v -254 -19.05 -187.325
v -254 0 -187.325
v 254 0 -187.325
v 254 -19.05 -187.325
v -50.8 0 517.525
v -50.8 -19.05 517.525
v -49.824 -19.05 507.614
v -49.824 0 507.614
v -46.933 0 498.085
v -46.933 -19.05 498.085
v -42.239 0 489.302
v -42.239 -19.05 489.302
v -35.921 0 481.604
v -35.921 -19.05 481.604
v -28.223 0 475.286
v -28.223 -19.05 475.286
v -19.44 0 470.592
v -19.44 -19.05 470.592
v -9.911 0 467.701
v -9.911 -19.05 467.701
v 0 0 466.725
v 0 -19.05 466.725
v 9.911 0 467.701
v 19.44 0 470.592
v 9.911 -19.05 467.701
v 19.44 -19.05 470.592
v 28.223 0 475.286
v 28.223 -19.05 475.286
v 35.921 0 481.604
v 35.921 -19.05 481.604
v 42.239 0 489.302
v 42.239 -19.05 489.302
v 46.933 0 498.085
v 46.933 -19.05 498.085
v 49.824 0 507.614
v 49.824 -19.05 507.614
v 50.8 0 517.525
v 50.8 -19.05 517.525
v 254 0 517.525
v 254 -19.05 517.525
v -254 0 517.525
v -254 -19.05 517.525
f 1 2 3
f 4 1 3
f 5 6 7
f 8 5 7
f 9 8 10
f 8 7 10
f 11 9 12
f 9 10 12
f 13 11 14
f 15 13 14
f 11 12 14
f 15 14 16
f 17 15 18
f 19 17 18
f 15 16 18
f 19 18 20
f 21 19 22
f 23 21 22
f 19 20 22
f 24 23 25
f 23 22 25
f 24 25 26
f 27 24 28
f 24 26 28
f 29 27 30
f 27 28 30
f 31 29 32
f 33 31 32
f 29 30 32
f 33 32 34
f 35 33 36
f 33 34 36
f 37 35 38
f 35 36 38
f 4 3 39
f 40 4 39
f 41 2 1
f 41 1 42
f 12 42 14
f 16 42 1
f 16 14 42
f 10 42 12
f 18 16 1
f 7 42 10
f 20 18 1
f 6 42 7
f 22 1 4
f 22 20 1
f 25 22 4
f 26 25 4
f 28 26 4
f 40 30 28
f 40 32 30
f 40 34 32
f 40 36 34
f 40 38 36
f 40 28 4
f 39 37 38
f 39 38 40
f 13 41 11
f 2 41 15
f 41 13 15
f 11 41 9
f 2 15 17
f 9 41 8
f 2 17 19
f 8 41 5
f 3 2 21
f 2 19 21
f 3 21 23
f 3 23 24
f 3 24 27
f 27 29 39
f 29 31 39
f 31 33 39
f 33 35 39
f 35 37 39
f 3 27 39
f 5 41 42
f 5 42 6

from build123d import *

# Parameters (mm, degrees)
F0_W     = 508
F0_H     = 1035.05
F1_DEPTH = 19.05
F3_DEPTH = 25.4
F4_DEPTH = 330.2


with BuildPart() as f1:
    # F0 (on Front) → F1 (new body)
    with BuildSketch(Plane.XZ):
        Rectangle(F0_W, F0_H)
    extrude(amount=F1_DEPTH)

    # F2 (on face) → F3 (cut)
    with BuildSketch(Plane.XZ.offset(19.05)):
        with BuildLine():
            ThreePointArc((-50.8, 517.525), (0, 466.725), (50.8, 517.525))
            Line((50.8, 517.525), (-50.8, 517.525))
        make_face()
    extrude(amount=-F3_DEPTH, mode=Mode.SUBTRACT)

    # F4 (cut): a face of the model
    f4_faces = [f1.faces().sort_by_distance(p)[0] for p in [
        (0, -9.525, -517.525),
    ]]
    extrude(f4_faces, amount=-F4_DEPTH, mode=Mode.SUBTRACT)


solid = f1.part
